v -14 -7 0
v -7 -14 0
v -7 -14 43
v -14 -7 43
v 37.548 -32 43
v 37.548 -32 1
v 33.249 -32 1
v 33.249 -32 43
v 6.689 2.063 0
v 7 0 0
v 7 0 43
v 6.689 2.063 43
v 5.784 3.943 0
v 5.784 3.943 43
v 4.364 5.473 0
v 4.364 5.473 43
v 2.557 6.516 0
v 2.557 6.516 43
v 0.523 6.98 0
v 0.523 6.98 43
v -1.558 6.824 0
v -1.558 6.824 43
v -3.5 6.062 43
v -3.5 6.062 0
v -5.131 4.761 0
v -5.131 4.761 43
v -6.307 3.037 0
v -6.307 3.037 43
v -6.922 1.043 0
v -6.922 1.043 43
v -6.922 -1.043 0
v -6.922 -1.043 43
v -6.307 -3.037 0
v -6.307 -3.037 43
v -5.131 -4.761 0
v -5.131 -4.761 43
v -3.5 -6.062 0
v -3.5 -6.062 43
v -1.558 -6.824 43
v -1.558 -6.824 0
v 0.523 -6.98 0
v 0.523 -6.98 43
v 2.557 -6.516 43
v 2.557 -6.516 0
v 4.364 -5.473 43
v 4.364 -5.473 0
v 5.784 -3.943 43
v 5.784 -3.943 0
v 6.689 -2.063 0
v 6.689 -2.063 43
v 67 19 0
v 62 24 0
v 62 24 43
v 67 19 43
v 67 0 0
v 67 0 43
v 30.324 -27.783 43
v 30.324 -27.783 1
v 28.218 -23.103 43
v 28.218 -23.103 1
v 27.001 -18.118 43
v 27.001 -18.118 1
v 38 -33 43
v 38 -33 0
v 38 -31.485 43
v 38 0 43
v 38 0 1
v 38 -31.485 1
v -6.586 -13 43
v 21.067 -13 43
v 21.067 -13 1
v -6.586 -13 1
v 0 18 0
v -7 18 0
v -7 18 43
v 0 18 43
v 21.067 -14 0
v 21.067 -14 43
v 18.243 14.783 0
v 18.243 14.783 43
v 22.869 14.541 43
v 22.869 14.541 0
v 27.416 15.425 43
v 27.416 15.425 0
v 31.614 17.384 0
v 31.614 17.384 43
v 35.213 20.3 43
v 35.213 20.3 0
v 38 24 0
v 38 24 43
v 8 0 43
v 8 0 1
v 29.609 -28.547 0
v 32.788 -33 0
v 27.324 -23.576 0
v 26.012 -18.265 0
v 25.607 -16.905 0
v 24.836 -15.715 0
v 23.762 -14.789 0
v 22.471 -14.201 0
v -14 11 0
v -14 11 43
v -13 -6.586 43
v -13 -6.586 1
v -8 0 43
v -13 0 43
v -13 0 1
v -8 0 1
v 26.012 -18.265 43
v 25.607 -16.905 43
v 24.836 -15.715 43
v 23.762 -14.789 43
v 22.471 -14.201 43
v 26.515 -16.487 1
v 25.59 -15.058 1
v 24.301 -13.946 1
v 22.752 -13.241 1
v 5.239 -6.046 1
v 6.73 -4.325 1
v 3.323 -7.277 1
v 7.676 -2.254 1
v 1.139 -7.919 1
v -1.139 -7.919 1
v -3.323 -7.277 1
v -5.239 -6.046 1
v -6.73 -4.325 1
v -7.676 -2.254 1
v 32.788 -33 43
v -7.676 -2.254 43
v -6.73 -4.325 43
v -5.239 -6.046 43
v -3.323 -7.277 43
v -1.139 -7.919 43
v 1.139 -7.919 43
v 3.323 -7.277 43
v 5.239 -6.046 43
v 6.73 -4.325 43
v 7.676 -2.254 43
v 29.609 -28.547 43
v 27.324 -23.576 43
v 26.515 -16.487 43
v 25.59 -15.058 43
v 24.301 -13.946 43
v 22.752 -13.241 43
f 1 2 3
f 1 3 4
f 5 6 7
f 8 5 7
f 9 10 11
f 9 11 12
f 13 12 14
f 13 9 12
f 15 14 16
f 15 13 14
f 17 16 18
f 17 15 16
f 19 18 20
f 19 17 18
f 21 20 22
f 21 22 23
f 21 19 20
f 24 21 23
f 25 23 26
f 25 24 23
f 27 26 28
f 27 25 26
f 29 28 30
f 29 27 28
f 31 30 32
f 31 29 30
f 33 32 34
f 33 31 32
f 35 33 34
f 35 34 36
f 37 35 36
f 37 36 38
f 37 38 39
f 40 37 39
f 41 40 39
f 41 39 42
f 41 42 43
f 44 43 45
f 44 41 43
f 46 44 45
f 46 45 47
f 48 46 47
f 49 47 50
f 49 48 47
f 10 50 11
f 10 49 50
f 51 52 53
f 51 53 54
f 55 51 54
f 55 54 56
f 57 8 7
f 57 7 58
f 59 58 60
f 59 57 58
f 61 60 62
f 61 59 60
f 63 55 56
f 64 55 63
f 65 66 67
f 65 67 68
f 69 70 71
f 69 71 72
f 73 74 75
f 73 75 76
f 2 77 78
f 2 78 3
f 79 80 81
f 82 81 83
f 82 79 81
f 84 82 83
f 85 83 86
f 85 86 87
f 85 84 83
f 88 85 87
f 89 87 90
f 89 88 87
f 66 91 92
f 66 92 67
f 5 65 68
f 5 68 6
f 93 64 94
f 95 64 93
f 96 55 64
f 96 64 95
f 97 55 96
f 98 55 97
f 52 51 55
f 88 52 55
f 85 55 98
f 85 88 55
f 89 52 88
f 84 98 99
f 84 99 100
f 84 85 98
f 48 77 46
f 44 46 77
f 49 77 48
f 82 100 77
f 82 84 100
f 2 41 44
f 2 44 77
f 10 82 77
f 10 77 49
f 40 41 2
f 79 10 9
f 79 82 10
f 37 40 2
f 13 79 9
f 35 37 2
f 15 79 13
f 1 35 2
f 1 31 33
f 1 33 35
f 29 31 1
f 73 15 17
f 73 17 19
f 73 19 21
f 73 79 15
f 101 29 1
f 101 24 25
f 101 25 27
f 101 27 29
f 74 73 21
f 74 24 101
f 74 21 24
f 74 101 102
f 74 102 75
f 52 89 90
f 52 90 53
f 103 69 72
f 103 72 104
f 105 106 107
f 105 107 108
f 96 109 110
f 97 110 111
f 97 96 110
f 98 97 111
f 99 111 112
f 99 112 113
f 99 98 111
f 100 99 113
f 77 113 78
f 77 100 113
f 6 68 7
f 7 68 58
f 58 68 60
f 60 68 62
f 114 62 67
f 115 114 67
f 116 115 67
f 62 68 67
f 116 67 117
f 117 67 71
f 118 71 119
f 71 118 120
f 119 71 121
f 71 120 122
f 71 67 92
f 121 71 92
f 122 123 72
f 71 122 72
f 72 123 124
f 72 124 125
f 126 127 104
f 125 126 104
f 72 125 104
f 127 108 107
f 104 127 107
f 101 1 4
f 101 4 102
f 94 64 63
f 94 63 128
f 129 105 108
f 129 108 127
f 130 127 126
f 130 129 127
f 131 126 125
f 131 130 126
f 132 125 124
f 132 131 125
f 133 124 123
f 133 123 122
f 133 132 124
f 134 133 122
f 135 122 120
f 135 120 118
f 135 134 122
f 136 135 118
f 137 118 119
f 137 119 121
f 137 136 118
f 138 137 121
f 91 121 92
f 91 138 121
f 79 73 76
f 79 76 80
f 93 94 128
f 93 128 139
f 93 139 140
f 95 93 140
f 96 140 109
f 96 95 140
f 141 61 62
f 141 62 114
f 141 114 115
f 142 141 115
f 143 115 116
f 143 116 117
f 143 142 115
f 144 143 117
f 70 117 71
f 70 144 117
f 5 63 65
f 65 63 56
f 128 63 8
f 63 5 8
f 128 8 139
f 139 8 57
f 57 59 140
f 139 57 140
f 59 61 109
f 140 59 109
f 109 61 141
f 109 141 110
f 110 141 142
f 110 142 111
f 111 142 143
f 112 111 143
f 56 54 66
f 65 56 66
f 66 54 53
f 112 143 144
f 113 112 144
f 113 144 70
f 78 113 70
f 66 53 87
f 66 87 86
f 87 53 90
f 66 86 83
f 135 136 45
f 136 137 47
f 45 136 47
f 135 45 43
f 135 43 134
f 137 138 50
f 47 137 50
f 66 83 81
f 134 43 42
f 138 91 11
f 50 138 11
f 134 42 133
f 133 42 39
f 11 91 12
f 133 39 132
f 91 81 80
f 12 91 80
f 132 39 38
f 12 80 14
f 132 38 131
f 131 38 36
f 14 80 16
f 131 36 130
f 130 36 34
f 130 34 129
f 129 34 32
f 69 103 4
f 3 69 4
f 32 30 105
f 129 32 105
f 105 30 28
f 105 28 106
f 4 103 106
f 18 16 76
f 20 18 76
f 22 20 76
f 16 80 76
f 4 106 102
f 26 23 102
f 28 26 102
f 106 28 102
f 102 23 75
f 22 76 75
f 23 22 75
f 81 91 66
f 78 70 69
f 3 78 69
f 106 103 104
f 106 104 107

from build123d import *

# Parameters (mm, degrees)
SKETCH1_R           = 7
BOSS_EXTRUDE1_DEPTH = 43
CUT_EXTRUDE1_DEPTH  = 42


with BuildPart() as part:
    # Sketch1 → Boss-Extrude1 (new body)
    with BuildSketch(Plane.XY):
        with BuildLine():
            Line((-14, -7), (-14, 11))
            Line((-14, 11), (-7, 18))
            Line((-7, 18), (0, 18))
            Line((0, 18), (18.243084988, 14.783251905))
            ThreePointArc((18.243084988, 14.783251905), (29.574972961, 16.276069151), (38, 24))
            Line((38, 24), (62, 24))
            Line((62, 24), (67, 19))
            Line((67, 19), (67, 0))
            Line((67, 0), (38, -33))
            Line((38, -33), (32.788067397, -33))
            ThreePointArc((32.788067397, -33), (28.3490952, -26.115672061), (26.012264997, -18.264705882))
            ThreePointArc((26.012264997, -18.264705882), (24.331862036, -15.213413768), (21.066626255, -14))
            Line((21.066626255, -14), (-7, -14))
            Line((-7, -14), (-14, -7))
        make_face()
        Circle(SKETCH1_R, mode=Mode.SUBTRACT)
    extrude(amount=BOSS_EXTRUDE1_DEPTH)

    # Sketch2 → Cut-Extrude1 (cut)
    with BuildSketch(Plane.XY.offset(43)):
        with BuildLine():
            Line((8, 0), (38, 0))
            Line((38, 0), (38, -31.485111542))
            Line((38, -31.485111542), (37.547522264, -32))
            Line((37.547522264, -32), (33.249359107, -32))
            ThreePointArc((33.249359107, -32), (29.163792236, -25.491599052), (27.001392745, -18.117647059))
            ThreePointArc((27.001392745, -18.117647059), (24.984909193, -14.456096521), (21.066626255, -13))
            Line((21.066626255, -13), (-6.585786438, -13))
            Line((-6.585786438, -13), (-13, -6.585786438))
            Line((-13, -6.585786438), (-13, 0))
            Line((-13, 0), (-8, 0))
            ThreePointArc((-8, 0), (0, -8), (8, 0))
        make_face()
    extrude(amount=-CUT_EXTRUDE1_DEPTH, mode=Mode.SUBTRACT)


solid = part.part
